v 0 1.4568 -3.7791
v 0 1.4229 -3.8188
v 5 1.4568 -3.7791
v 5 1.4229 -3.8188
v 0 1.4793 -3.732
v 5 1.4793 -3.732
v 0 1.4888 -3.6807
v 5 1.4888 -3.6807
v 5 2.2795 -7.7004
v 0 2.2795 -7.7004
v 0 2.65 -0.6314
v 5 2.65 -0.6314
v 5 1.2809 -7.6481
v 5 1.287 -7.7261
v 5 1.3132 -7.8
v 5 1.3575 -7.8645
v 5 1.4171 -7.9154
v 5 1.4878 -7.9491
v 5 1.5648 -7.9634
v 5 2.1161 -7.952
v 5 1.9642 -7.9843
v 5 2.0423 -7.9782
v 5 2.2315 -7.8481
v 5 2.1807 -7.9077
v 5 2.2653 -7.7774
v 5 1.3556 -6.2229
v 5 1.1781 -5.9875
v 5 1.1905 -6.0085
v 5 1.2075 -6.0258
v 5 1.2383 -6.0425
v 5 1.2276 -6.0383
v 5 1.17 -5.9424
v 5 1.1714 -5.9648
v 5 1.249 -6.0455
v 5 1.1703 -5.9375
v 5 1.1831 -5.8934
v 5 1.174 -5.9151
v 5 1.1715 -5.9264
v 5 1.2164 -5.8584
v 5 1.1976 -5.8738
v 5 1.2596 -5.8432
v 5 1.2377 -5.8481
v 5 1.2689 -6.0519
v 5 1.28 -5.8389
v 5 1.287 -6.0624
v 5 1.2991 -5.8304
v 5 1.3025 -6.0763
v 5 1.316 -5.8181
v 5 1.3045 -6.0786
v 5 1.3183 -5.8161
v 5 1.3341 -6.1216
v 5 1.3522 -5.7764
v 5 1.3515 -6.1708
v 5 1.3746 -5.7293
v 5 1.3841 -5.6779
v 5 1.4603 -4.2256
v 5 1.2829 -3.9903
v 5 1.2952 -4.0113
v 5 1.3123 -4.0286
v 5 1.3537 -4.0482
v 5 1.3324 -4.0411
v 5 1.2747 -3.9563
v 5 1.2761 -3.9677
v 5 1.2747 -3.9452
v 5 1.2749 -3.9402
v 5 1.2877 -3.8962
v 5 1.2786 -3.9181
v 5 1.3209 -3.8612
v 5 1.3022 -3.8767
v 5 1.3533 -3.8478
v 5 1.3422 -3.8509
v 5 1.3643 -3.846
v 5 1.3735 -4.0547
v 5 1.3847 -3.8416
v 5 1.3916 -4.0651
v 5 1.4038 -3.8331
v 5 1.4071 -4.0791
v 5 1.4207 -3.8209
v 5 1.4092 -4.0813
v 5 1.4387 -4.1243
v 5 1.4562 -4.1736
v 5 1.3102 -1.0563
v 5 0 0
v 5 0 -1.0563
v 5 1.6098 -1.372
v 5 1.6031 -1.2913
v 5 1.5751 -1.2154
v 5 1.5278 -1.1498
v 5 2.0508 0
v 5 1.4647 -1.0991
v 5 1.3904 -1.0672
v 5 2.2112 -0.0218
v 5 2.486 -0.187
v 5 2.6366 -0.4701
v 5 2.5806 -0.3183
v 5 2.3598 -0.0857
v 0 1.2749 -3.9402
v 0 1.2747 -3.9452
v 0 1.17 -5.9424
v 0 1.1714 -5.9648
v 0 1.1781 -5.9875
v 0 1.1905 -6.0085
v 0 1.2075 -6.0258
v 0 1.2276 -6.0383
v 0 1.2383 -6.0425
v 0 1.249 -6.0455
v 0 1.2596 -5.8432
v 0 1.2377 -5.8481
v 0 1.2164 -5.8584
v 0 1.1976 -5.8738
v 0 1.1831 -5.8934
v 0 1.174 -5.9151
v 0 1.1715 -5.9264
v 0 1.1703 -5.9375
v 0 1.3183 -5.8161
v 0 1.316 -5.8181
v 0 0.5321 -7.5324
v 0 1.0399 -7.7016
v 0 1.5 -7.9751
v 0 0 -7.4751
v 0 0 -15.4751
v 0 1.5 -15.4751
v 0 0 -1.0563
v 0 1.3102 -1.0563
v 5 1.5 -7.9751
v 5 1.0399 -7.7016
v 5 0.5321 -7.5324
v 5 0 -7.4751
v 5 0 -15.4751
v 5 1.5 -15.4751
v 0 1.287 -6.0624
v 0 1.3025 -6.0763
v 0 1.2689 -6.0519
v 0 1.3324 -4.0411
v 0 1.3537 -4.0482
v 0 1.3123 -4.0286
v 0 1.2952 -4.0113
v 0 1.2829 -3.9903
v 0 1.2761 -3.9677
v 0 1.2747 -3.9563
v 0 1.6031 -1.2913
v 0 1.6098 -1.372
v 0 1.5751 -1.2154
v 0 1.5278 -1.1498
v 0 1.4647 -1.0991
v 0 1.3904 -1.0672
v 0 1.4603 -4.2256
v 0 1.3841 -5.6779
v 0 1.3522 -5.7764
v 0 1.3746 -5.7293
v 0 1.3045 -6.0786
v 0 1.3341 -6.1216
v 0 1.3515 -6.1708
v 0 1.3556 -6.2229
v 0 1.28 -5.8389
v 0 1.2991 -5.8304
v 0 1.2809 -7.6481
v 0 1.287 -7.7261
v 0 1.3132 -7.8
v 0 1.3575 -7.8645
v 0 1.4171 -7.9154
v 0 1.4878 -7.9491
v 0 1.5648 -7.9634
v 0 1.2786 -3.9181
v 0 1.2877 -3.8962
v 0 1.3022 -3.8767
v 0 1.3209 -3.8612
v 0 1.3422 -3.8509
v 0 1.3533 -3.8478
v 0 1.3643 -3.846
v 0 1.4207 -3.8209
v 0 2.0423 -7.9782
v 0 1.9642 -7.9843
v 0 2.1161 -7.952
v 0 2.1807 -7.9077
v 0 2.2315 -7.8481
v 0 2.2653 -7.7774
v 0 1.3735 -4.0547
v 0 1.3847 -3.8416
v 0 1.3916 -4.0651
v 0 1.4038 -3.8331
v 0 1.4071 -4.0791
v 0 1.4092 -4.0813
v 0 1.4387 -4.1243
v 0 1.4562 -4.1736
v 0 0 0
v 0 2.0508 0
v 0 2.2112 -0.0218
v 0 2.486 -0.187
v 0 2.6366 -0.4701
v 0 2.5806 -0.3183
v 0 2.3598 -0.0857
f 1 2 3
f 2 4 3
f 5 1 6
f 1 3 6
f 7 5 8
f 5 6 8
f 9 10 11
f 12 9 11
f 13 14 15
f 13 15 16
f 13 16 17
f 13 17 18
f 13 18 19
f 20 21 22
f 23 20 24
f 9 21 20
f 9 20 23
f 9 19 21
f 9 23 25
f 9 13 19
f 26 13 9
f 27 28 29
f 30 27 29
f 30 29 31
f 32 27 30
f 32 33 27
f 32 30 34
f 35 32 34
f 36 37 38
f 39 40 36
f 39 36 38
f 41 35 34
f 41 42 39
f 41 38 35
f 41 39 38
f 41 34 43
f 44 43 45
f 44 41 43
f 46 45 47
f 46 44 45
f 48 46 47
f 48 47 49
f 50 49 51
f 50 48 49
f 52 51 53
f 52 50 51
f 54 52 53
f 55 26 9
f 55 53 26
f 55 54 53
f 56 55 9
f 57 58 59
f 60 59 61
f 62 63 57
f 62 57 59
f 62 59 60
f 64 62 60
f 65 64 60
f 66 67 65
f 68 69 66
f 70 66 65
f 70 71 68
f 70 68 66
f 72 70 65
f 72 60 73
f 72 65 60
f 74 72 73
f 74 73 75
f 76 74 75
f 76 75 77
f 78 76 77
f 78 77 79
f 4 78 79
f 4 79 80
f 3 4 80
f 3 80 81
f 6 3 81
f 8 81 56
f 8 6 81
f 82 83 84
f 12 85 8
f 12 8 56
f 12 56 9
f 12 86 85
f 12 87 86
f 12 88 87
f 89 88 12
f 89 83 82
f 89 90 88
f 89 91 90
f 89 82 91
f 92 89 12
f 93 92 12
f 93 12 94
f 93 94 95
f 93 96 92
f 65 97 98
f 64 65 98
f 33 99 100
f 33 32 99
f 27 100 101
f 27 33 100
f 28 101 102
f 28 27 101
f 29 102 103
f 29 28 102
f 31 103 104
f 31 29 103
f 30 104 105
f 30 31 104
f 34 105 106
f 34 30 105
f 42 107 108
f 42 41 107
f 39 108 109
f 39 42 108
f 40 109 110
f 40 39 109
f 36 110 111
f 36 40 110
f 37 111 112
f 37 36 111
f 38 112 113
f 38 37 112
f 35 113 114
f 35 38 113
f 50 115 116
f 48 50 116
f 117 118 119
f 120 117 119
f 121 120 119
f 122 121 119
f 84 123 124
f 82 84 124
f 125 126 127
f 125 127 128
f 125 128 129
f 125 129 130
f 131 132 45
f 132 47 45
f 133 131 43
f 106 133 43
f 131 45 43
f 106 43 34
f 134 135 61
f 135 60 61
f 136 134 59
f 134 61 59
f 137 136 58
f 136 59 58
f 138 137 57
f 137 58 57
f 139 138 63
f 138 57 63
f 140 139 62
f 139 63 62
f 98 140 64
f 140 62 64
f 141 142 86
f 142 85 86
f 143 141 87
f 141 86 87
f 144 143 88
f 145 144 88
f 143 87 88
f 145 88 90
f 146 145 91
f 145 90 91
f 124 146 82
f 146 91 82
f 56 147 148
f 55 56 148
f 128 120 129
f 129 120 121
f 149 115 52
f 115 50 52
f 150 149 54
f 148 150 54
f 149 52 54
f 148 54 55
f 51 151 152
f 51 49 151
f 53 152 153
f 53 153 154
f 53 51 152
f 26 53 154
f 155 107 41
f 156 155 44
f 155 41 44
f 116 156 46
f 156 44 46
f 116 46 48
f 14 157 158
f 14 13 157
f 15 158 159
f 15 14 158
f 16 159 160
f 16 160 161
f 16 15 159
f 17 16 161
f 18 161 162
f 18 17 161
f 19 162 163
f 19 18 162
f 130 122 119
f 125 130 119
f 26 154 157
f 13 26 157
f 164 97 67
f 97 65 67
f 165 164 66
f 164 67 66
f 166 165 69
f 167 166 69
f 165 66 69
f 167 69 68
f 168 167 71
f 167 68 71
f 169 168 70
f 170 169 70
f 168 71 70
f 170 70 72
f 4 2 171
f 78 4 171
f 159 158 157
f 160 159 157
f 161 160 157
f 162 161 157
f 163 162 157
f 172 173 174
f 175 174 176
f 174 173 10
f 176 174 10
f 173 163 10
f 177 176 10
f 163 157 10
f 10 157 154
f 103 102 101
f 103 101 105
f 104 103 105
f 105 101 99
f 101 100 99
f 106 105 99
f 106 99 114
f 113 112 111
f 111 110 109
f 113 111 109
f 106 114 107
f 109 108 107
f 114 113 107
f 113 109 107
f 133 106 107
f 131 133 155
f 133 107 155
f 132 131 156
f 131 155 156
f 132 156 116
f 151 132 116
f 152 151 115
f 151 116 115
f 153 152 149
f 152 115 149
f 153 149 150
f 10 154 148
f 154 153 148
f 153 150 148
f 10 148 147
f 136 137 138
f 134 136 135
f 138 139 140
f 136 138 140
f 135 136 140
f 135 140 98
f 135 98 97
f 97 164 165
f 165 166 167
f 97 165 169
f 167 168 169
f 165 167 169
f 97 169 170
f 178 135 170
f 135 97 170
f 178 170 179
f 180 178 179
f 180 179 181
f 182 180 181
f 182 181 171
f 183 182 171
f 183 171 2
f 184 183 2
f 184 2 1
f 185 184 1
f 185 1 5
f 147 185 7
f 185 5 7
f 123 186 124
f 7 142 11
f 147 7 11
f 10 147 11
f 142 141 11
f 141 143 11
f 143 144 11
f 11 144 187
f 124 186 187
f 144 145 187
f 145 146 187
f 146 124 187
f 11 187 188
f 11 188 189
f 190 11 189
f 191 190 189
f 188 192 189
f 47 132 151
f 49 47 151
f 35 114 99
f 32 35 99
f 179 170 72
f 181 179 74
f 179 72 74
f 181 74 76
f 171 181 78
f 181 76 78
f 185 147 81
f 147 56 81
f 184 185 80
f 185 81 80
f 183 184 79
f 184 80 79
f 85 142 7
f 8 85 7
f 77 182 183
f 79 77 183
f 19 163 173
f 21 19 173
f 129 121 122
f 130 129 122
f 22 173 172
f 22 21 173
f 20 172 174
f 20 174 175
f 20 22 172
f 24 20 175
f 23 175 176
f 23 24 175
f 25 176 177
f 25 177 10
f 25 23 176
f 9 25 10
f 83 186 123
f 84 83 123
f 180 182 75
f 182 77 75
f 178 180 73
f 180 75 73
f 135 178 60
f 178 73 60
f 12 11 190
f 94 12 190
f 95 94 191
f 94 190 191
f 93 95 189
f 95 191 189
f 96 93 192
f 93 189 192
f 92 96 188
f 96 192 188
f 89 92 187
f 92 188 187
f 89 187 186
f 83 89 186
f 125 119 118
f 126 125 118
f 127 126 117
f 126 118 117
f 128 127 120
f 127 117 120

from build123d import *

# Parameters (mm, degrees)
F0_DEPTH  = 5
F1_R      = 0.3
F2_R      = 0.1
F9_R      = 0.2
F10_R     = 0.1
F3_R      = 0.1
F4_R      = 0.2
F5_R      = 0.2
F6_R      = 0.1
F11_R     = 0.1
F7_R      = 0.3
F13_DEPTH = 5


with BuildPart() as f0:
    # F8 (on Right) → F0 (new body)
    with BuildSketch(Plane.YZ):
        with BuildLine():
            Line((2.050822, 0), (0, 0))
            Line((0, 0), (0, -1.056272))
            Line((0, -1.056272), (1.626361, -1.056272))
            Line((1.626361, -1.056272), (1.484486, -3.763406))
            Line((1.484486, -3.763406), (1.389899, -3.848573))
            Line((1.389899, -3.848573), (1.28005, -3.842816))
            Line((1.28005, -3.842816), (1.269583, -4.042542))
            Line((1.269583, -4.042542), (1.379432, -4.048299))
            Line((1.379432, -4.048299), (1.464599, -4.142886))
            Line((1.464599, -4.142886), (1.379814, -5.760665))
            Line((1.379814, -5.760665), (1.285227, -5.845832))
            Line((1.285227, -5.845832), (1.175378, -5.840075))
            Line((1.175378, -5.840075), (1.164911, -6.039801))
            Line((1.164911, -6.039801), (1.27476, -6.045558))
            Line((1.27476, -6.045558), (1.359927, -6.140145))
            Line((1.359927, -6.140145), (1.265199, -7.947664))
            Line((1.265199, -7.947664), (2.263828, -8))
            Line((2.263828, -8), (2.65, -0.631402))
            ThreePointArc((2.65, -0.631402), (2.486047, -0.186987), (2.050822, 0))
        make_face()
    extrude(amount=F0_DEPTH)

    # F1
    f1_edges = [f0.edges().sort_by_distance(p)[0] for p in [
        (2.5, 1.265199, -7.947664),
        (2.5, 2.263828, -8),
    ]]
    fillet(f1_edges, radius=F1_R)

    # F2
    f2_edges = [f0.edges().sort_by_distance(p)[0] for p in [
        (2.5, 1.27476, -6.045558),
    ]]
    fillet(f2_edges, radius=F2_R)

    # F9
    f9_edges = [f0.edges().sort_by_distance(p)[0] for p in [
        (2.5, 1.359927, -6.140145),
    ]]
    fillet(f9_edges, radius=F9_R)

    # F10
    f10_edges = [f0.edges().sort_by_distance(p)[0] for p in [
        (2.5, 1.285227, -5.845832),
    ]]
    fillet(f10_edges, radius=F10_R)

    # F3
    f3_edges = [f0.edges().sort_by_distance(p)[0] for p in [
        (2.5, 1.175378, -5.840075),
        (2.5, 1.164911, -6.039801),
    ]]
    fillet(f3_edges, radius=F3_R)

    # F4
    f4_edges = [f0.edges().sort_by_distance(p)[0] for p in [
        (2.5, 1.379814, -5.760665),
    ]]
    fillet(f4_edges, radius=F4_R)

    # F5
    f5_edges = [f0.edges().sort_by_distance(p)[0] for p in [
        (2.5, 1.464599, -4.142886),
        (2.5, 1.484486, -3.763406),
    ]]
    fillet(f5_edges, radius=F5_R)

    # F6
    f6_edges = [f0.edges().sort_by_distance(p)[0] for p in [
        (2.5, 1.379432, -4.048299),
        (2.5, 1.389899, -3.848573),
    ]]
    fillet(f6_edges, radius=F6_R)

    # F11
    f11_edges = [f0.edges().sort_by_distance(p)[0] for p in [
        (2.5, 1.269583, -4.042542),
        (2.5, 1.28005, -3.842816),
    ]]
    fillet(f11_edges, radius=F11_R)

    # F7
    f7_edges = [f0.edges().sort_by_distance(p)[0] for p in [
        (2.5, 1.626361, -1.056272),
    ]]
    fillet(f7_edges, radius=F7_R)


with BuildPart() as f13:
    # F12 (on Right) → F13 (new body)
    with BuildSketch(Plane.YZ):
        with BuildLine():
            Line((1.5, -15.475065), (1.5, -7.975065))
            ThreePointArc((1.5, -7.975065), (0.790569, -7.603357), (0, -7.475065))
            Line((0, -7.475065), (0, -15.475065))
            Line((0, -15.475065), (1.5, -15.475065))
        make_face()
    extrude(amount=F13_DEPTH)


solid = Compound([f0.part, f13.part])
